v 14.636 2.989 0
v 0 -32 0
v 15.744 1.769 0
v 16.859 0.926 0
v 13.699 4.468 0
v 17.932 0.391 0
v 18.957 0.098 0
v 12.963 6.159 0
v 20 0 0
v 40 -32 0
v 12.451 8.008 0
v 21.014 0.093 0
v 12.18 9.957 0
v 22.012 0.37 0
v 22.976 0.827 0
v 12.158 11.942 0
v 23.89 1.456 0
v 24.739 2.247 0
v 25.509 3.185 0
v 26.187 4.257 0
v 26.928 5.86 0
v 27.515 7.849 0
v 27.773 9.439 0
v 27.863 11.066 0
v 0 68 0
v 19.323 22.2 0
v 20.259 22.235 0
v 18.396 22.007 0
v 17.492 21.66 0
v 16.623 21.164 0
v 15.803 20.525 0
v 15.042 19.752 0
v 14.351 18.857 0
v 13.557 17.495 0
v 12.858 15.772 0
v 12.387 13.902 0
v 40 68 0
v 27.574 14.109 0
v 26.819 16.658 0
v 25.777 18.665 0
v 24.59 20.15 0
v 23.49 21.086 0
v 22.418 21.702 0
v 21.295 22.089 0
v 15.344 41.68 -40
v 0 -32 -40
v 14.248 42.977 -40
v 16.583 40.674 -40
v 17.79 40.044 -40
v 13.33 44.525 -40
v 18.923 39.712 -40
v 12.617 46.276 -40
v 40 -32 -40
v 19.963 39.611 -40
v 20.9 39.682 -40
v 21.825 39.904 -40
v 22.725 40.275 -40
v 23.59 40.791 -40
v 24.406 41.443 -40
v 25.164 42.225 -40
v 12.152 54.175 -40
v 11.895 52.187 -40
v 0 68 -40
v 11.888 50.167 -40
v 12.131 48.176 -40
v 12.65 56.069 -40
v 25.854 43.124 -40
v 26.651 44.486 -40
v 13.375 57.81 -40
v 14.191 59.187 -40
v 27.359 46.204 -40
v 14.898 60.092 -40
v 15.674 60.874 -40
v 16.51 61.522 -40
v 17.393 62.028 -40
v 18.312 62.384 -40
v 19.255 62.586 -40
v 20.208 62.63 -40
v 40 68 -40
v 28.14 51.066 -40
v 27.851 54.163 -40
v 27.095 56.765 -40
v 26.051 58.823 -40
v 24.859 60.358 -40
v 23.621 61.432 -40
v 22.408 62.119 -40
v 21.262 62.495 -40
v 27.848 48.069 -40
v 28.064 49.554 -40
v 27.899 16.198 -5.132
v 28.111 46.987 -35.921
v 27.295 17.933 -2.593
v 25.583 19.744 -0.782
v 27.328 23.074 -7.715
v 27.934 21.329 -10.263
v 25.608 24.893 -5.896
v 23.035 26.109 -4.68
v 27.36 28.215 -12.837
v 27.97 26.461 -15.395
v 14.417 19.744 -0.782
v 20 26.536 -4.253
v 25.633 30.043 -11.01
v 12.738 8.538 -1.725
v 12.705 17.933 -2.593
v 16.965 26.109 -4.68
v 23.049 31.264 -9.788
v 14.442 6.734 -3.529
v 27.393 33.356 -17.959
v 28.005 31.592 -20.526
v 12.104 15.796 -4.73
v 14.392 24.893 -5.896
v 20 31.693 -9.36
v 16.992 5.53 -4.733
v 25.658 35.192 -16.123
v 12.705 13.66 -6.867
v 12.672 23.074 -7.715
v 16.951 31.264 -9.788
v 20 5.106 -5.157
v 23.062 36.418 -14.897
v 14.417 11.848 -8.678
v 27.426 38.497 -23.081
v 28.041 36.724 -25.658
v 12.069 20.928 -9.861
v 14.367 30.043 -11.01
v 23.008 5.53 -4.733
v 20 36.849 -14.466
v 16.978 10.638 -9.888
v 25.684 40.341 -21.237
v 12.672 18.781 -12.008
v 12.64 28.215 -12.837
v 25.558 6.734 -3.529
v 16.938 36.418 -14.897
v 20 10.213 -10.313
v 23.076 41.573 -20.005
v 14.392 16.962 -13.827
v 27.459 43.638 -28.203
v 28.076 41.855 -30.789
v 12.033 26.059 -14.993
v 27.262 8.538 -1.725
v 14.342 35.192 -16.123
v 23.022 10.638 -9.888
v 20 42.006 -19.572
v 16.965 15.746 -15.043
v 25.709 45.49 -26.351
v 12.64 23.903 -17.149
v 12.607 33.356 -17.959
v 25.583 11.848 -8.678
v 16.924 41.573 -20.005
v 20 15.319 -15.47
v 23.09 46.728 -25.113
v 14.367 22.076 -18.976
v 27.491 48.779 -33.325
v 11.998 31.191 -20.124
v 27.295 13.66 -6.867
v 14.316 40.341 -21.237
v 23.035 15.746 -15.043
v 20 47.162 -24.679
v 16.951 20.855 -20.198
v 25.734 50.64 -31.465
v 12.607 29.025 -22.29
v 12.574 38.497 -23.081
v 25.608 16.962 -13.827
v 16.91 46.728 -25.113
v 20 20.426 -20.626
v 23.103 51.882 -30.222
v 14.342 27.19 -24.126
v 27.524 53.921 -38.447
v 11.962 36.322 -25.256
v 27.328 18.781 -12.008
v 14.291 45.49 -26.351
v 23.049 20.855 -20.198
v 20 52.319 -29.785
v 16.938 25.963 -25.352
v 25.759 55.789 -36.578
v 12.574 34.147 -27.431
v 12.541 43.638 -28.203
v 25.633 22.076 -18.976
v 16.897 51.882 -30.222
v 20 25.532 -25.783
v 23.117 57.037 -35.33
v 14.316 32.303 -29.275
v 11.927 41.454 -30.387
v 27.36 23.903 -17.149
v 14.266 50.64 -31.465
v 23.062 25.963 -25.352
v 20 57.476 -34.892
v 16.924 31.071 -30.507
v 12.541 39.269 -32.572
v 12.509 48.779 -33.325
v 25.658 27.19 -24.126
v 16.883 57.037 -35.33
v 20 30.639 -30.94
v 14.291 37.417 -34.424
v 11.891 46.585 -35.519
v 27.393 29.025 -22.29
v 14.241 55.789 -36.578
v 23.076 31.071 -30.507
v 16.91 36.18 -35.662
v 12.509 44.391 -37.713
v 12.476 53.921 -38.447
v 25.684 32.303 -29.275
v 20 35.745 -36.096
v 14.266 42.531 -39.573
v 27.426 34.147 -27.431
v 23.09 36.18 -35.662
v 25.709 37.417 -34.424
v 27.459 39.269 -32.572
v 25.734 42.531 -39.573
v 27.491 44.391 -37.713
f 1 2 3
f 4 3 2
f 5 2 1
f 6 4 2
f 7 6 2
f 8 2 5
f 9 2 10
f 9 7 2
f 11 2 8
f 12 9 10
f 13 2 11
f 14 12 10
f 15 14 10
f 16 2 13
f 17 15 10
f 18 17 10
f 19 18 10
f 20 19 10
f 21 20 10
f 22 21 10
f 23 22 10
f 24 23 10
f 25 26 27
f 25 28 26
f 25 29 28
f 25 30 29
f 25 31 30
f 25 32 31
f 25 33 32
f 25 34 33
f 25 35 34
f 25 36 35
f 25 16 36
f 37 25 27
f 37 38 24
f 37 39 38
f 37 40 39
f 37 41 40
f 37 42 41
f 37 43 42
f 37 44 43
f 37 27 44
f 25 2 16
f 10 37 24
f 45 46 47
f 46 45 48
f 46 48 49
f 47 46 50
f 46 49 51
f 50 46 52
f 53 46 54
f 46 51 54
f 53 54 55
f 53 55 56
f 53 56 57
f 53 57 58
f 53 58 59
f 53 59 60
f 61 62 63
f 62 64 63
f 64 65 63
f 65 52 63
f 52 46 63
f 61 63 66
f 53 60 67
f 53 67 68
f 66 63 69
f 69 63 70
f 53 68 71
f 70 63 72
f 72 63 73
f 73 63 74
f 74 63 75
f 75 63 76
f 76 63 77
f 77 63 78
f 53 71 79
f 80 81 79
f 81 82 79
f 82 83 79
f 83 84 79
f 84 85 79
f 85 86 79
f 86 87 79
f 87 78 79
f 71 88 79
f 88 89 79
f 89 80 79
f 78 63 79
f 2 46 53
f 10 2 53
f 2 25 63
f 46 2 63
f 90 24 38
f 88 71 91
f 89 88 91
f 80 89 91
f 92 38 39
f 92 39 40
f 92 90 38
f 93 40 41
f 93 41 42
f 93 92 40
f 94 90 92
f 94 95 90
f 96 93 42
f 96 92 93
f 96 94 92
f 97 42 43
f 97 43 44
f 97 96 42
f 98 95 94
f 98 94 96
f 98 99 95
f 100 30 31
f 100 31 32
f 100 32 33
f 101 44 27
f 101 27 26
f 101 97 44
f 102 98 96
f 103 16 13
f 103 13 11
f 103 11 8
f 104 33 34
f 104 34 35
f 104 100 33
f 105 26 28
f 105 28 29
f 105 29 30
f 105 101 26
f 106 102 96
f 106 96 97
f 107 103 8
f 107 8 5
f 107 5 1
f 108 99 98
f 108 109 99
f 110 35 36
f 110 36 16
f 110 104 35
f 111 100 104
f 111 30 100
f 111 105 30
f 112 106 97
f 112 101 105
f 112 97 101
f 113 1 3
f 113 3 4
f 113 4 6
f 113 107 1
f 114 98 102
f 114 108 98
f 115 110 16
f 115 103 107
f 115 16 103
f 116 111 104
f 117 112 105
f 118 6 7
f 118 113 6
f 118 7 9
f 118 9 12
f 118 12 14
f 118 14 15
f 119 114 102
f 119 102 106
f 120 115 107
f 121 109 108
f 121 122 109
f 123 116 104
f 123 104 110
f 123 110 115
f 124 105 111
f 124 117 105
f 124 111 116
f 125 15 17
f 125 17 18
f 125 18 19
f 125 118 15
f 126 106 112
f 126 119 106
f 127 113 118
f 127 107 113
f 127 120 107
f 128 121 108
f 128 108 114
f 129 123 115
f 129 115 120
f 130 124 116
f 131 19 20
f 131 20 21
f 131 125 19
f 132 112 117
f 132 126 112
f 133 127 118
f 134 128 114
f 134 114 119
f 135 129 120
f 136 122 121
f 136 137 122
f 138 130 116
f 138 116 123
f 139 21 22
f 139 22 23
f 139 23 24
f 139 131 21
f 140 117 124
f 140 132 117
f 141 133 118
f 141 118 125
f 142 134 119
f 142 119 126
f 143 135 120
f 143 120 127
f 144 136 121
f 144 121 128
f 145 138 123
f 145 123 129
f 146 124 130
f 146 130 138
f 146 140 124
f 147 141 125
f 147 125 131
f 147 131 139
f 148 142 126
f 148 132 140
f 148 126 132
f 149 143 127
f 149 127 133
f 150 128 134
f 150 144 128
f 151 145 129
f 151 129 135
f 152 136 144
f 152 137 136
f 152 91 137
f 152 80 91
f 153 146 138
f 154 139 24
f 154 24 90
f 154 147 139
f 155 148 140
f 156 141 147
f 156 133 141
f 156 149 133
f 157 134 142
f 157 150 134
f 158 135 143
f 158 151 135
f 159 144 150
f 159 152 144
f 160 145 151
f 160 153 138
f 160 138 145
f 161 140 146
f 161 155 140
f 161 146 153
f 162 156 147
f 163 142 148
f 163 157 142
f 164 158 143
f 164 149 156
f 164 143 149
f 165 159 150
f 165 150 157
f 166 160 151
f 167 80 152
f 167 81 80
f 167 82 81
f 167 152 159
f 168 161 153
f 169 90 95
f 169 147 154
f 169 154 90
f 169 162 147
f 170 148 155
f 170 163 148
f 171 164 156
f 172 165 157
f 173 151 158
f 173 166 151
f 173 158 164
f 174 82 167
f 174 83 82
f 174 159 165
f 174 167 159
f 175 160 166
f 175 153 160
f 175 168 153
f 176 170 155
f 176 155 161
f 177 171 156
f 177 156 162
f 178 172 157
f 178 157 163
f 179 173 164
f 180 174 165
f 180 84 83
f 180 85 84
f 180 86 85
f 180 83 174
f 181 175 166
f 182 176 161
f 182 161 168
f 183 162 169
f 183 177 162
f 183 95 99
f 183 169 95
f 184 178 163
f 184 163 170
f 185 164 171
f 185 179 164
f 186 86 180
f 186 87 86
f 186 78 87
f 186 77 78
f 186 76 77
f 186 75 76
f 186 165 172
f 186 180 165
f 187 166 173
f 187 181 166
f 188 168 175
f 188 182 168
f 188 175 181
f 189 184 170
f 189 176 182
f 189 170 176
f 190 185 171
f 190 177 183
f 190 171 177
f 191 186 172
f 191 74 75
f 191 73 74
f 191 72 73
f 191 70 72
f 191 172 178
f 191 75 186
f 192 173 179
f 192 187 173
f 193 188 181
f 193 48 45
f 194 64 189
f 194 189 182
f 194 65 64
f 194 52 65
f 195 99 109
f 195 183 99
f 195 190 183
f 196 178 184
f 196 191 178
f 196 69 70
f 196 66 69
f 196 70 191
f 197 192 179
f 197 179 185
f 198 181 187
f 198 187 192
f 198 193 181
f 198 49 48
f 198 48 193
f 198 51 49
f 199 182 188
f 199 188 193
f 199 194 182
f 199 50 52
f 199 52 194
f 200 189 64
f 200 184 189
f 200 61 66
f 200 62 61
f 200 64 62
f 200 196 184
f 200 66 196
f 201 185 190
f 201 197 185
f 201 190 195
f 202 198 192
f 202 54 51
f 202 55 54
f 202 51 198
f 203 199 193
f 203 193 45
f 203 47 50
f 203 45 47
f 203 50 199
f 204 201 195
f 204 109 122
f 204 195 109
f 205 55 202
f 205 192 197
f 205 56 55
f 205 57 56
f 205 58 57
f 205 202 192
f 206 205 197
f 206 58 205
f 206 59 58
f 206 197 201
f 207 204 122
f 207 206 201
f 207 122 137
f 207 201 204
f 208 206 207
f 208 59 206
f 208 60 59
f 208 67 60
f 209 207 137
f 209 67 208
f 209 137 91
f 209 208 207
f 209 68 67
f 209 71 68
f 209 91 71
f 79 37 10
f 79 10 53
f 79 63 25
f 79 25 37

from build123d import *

# Parameters (mm, degrees)
SKETCH1_W                = 40
SKETCH1_H                = 40
BOSS_EXTRUDE1_DEPTH      = 68
BOSS_EXTRUDE1_DEPTH_BACK = 32
SKETCH4_R                = 7.825
CUT_EXTRUDE2_DEPTH       = 77.367532368
CUT_EXTRUDE2_TAPER       = -0.28


with BuildPart() as part:
    # Sketch1 → Boss-Extrude1 (new body, two sides)
    with BuildSketch(Plane(origin=(0, 0, 0), x_dir=(1, 0, 0), z_dir=(0, 1, 0))) as boss_extrude1_sk:
        with Locations((20, 20)):
            Rectangle(SKETCH1_W, SKETCH1_H)
    extrude(amount=BOSS_EXTRUDE1_DEPTH)
    extrude(boss_extrude1_sk.sketch, amount=-BOSS_EXTRUDE1_DEPTH_BACK)

    # Sketch4 → Cut-Extrude2 (cut, through all)
    with BuildSketch(Plane(origin=(0, 0, 0), x_dir=(1, 0, 0), z_dir=(0, -0.707106781, 0.707106781))):
        with Locations((20, 7.825)):
            Circle(SKETCH4_R)
    extrude(amount=-CUT_EXTRUDE2_DEPTH, taper=CUT_EXTRUDE2_TAPER, mode=Mode.SUBTRACT)


solid = part.part
